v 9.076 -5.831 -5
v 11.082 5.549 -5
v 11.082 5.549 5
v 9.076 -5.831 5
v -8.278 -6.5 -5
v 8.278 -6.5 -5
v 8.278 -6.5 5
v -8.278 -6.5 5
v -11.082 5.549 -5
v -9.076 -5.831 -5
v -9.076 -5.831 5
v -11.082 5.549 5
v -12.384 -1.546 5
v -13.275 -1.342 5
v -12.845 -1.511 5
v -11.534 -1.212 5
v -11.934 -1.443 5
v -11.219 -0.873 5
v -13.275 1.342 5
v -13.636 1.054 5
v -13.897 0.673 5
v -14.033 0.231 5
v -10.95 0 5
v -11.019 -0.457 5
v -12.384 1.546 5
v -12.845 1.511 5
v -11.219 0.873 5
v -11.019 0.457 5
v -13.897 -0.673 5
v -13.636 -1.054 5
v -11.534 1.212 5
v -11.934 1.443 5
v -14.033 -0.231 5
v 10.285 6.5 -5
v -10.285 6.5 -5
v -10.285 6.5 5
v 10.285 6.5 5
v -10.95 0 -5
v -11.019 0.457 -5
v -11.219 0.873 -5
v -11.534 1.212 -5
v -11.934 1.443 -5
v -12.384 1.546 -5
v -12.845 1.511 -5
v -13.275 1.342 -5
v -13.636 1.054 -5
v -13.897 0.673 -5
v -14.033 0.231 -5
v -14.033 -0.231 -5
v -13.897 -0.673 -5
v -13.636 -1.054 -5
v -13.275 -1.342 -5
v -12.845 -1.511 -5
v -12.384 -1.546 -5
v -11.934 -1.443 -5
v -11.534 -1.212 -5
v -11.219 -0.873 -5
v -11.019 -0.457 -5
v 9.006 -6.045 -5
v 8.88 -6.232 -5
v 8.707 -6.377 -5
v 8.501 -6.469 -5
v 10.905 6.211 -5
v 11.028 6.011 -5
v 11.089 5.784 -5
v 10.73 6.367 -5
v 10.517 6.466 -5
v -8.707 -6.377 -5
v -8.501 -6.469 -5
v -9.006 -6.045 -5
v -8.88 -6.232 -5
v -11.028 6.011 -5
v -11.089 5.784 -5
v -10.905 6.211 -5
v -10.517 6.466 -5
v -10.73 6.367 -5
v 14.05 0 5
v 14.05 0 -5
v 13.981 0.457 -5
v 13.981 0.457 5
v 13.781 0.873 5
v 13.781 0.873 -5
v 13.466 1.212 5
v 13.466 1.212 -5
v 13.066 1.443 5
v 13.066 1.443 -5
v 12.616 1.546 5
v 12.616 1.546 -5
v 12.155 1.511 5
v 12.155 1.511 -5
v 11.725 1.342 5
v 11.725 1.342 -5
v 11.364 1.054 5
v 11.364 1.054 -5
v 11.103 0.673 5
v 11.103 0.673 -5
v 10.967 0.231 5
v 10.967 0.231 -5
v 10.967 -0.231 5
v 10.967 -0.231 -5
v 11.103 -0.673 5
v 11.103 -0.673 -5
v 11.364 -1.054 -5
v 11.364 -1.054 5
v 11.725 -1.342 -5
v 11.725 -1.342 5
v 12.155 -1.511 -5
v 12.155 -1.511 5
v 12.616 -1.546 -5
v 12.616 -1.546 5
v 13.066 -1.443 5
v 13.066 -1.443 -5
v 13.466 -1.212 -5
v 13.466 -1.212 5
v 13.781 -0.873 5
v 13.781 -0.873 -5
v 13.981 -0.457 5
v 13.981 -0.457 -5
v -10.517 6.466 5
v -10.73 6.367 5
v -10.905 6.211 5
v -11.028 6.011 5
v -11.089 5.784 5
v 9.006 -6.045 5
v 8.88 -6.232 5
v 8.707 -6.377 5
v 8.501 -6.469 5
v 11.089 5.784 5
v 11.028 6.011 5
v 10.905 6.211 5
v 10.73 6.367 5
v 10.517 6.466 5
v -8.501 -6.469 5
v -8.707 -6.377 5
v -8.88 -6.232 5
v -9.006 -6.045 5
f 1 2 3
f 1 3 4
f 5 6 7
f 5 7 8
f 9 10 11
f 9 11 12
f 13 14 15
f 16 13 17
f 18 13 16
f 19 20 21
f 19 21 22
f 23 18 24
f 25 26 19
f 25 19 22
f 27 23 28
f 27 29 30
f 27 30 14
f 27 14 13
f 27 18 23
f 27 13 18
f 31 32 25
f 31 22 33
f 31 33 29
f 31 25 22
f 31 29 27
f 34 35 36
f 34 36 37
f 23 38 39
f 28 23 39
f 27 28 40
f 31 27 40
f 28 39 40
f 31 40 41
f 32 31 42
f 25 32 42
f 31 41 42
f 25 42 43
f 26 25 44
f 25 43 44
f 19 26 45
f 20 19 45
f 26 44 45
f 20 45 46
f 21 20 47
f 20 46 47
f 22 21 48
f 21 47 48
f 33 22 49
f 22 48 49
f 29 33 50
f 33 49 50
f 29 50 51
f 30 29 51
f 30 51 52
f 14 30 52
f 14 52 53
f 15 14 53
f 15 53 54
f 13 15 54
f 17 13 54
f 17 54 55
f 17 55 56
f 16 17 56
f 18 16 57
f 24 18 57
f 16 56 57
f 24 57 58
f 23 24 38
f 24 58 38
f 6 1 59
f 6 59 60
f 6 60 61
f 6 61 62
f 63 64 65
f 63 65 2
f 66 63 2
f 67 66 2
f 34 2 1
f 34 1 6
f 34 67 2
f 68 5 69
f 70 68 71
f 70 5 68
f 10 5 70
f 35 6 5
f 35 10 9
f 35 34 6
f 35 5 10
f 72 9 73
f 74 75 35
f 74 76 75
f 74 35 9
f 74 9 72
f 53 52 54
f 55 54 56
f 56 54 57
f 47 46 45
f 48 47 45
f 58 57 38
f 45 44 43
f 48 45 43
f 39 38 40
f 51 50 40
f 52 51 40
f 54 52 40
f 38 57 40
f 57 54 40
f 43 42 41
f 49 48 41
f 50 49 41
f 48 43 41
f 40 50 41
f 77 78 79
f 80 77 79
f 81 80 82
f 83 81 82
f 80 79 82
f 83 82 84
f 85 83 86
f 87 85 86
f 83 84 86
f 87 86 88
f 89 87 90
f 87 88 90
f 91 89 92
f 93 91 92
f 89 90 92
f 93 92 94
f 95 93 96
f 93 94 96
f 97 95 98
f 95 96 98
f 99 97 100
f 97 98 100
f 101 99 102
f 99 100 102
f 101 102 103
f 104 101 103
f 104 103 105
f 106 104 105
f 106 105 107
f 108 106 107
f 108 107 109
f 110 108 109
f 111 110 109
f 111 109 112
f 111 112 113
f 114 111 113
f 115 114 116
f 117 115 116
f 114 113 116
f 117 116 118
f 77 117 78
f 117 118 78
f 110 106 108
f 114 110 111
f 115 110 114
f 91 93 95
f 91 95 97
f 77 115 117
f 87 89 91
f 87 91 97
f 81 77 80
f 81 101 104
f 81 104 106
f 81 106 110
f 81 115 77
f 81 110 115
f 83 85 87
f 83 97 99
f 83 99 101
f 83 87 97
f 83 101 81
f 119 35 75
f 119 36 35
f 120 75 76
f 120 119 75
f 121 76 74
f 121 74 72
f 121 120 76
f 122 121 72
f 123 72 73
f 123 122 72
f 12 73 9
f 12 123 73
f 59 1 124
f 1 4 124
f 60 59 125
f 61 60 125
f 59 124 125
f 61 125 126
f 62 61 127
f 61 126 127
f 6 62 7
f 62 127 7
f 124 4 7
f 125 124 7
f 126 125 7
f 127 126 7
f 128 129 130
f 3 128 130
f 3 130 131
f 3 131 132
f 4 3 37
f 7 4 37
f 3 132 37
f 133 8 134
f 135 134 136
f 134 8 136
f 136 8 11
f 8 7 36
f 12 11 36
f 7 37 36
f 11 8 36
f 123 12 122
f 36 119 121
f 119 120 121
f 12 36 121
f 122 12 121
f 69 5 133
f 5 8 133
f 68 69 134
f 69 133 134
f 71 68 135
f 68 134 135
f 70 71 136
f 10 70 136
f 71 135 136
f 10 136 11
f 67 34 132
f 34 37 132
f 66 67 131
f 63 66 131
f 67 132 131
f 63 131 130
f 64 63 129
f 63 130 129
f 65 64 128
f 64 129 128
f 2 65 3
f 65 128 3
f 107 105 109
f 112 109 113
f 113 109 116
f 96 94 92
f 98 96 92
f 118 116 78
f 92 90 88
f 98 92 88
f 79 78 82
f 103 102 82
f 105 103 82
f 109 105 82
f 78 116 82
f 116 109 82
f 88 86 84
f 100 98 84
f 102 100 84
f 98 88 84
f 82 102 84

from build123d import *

# Parameters (mm, degrees)
CYLINDER_R        = 1.55
CYLINDER_DEPTH    = 10
PAD001_DEPTH      = 10
CYLINDER001_R     = 1.55
CYLINDER001_DEPTH = 10
FILLET004_R       = 0.81


with BuildPart() as cylinder:
    # Cylinder → Cylinder (new body)
    with BuildSketch(Plane(origin=(12.5, 0, -5), x_dir=(1, 0, 0), z_dir=(0, 0, 1))):
        Circle(CYLINDER_R)
    extrude(amount=CYLINDER_DEPTH)


with BuildPart() as panel_cutout_rear:
    # Sketch001 → Pad001 (new body)
    with BuildSketch(Plane.XY):
        Polygon((-11.25, 6.5), (11.25, 6.5), (8.957749, -6.5), (-8.957749, -6.5), align=None)
    extrude(amount=PAD001_DEPTH)


with BuildPart() as panel_cutout_rear_1:
    # Body001 placement: moved
    add(panel_cutout_rear.part.moved(Location((0, 0, -5))))


with BuildPart() as panel_cutout_rear001:
    # Cylinder001 → Cylinder001 (new body)
    with BuildSketch(Plane(origin=(-12.5, 0, -5), x_dir=(1, 0, 0), z_dir=(0, 0, 1))):
        Circle(CYLINDER001_R)
    extrude(amount=CYLINDER001_DEPTH)

    # Fusion: union Cylinder, Panel Cutout Rear
    add(cylinder.part)
    add(panel_cutout_rear_1.part)

    # Fillet004
    fillet004_edges = [panel_cutout_rear001.edges().sort_by_distance(p)[0] for p in [
        (-11.25, 6.5, 0),
        (11.25, 6.5, 0),
        (8.957749, -6.5, 0),
        (-8.957749, -6.5, 0),
    ]]
    fillet(fillet004_edges, radius=FILLET004_R)


solid = panel_cutout_rear001.part
